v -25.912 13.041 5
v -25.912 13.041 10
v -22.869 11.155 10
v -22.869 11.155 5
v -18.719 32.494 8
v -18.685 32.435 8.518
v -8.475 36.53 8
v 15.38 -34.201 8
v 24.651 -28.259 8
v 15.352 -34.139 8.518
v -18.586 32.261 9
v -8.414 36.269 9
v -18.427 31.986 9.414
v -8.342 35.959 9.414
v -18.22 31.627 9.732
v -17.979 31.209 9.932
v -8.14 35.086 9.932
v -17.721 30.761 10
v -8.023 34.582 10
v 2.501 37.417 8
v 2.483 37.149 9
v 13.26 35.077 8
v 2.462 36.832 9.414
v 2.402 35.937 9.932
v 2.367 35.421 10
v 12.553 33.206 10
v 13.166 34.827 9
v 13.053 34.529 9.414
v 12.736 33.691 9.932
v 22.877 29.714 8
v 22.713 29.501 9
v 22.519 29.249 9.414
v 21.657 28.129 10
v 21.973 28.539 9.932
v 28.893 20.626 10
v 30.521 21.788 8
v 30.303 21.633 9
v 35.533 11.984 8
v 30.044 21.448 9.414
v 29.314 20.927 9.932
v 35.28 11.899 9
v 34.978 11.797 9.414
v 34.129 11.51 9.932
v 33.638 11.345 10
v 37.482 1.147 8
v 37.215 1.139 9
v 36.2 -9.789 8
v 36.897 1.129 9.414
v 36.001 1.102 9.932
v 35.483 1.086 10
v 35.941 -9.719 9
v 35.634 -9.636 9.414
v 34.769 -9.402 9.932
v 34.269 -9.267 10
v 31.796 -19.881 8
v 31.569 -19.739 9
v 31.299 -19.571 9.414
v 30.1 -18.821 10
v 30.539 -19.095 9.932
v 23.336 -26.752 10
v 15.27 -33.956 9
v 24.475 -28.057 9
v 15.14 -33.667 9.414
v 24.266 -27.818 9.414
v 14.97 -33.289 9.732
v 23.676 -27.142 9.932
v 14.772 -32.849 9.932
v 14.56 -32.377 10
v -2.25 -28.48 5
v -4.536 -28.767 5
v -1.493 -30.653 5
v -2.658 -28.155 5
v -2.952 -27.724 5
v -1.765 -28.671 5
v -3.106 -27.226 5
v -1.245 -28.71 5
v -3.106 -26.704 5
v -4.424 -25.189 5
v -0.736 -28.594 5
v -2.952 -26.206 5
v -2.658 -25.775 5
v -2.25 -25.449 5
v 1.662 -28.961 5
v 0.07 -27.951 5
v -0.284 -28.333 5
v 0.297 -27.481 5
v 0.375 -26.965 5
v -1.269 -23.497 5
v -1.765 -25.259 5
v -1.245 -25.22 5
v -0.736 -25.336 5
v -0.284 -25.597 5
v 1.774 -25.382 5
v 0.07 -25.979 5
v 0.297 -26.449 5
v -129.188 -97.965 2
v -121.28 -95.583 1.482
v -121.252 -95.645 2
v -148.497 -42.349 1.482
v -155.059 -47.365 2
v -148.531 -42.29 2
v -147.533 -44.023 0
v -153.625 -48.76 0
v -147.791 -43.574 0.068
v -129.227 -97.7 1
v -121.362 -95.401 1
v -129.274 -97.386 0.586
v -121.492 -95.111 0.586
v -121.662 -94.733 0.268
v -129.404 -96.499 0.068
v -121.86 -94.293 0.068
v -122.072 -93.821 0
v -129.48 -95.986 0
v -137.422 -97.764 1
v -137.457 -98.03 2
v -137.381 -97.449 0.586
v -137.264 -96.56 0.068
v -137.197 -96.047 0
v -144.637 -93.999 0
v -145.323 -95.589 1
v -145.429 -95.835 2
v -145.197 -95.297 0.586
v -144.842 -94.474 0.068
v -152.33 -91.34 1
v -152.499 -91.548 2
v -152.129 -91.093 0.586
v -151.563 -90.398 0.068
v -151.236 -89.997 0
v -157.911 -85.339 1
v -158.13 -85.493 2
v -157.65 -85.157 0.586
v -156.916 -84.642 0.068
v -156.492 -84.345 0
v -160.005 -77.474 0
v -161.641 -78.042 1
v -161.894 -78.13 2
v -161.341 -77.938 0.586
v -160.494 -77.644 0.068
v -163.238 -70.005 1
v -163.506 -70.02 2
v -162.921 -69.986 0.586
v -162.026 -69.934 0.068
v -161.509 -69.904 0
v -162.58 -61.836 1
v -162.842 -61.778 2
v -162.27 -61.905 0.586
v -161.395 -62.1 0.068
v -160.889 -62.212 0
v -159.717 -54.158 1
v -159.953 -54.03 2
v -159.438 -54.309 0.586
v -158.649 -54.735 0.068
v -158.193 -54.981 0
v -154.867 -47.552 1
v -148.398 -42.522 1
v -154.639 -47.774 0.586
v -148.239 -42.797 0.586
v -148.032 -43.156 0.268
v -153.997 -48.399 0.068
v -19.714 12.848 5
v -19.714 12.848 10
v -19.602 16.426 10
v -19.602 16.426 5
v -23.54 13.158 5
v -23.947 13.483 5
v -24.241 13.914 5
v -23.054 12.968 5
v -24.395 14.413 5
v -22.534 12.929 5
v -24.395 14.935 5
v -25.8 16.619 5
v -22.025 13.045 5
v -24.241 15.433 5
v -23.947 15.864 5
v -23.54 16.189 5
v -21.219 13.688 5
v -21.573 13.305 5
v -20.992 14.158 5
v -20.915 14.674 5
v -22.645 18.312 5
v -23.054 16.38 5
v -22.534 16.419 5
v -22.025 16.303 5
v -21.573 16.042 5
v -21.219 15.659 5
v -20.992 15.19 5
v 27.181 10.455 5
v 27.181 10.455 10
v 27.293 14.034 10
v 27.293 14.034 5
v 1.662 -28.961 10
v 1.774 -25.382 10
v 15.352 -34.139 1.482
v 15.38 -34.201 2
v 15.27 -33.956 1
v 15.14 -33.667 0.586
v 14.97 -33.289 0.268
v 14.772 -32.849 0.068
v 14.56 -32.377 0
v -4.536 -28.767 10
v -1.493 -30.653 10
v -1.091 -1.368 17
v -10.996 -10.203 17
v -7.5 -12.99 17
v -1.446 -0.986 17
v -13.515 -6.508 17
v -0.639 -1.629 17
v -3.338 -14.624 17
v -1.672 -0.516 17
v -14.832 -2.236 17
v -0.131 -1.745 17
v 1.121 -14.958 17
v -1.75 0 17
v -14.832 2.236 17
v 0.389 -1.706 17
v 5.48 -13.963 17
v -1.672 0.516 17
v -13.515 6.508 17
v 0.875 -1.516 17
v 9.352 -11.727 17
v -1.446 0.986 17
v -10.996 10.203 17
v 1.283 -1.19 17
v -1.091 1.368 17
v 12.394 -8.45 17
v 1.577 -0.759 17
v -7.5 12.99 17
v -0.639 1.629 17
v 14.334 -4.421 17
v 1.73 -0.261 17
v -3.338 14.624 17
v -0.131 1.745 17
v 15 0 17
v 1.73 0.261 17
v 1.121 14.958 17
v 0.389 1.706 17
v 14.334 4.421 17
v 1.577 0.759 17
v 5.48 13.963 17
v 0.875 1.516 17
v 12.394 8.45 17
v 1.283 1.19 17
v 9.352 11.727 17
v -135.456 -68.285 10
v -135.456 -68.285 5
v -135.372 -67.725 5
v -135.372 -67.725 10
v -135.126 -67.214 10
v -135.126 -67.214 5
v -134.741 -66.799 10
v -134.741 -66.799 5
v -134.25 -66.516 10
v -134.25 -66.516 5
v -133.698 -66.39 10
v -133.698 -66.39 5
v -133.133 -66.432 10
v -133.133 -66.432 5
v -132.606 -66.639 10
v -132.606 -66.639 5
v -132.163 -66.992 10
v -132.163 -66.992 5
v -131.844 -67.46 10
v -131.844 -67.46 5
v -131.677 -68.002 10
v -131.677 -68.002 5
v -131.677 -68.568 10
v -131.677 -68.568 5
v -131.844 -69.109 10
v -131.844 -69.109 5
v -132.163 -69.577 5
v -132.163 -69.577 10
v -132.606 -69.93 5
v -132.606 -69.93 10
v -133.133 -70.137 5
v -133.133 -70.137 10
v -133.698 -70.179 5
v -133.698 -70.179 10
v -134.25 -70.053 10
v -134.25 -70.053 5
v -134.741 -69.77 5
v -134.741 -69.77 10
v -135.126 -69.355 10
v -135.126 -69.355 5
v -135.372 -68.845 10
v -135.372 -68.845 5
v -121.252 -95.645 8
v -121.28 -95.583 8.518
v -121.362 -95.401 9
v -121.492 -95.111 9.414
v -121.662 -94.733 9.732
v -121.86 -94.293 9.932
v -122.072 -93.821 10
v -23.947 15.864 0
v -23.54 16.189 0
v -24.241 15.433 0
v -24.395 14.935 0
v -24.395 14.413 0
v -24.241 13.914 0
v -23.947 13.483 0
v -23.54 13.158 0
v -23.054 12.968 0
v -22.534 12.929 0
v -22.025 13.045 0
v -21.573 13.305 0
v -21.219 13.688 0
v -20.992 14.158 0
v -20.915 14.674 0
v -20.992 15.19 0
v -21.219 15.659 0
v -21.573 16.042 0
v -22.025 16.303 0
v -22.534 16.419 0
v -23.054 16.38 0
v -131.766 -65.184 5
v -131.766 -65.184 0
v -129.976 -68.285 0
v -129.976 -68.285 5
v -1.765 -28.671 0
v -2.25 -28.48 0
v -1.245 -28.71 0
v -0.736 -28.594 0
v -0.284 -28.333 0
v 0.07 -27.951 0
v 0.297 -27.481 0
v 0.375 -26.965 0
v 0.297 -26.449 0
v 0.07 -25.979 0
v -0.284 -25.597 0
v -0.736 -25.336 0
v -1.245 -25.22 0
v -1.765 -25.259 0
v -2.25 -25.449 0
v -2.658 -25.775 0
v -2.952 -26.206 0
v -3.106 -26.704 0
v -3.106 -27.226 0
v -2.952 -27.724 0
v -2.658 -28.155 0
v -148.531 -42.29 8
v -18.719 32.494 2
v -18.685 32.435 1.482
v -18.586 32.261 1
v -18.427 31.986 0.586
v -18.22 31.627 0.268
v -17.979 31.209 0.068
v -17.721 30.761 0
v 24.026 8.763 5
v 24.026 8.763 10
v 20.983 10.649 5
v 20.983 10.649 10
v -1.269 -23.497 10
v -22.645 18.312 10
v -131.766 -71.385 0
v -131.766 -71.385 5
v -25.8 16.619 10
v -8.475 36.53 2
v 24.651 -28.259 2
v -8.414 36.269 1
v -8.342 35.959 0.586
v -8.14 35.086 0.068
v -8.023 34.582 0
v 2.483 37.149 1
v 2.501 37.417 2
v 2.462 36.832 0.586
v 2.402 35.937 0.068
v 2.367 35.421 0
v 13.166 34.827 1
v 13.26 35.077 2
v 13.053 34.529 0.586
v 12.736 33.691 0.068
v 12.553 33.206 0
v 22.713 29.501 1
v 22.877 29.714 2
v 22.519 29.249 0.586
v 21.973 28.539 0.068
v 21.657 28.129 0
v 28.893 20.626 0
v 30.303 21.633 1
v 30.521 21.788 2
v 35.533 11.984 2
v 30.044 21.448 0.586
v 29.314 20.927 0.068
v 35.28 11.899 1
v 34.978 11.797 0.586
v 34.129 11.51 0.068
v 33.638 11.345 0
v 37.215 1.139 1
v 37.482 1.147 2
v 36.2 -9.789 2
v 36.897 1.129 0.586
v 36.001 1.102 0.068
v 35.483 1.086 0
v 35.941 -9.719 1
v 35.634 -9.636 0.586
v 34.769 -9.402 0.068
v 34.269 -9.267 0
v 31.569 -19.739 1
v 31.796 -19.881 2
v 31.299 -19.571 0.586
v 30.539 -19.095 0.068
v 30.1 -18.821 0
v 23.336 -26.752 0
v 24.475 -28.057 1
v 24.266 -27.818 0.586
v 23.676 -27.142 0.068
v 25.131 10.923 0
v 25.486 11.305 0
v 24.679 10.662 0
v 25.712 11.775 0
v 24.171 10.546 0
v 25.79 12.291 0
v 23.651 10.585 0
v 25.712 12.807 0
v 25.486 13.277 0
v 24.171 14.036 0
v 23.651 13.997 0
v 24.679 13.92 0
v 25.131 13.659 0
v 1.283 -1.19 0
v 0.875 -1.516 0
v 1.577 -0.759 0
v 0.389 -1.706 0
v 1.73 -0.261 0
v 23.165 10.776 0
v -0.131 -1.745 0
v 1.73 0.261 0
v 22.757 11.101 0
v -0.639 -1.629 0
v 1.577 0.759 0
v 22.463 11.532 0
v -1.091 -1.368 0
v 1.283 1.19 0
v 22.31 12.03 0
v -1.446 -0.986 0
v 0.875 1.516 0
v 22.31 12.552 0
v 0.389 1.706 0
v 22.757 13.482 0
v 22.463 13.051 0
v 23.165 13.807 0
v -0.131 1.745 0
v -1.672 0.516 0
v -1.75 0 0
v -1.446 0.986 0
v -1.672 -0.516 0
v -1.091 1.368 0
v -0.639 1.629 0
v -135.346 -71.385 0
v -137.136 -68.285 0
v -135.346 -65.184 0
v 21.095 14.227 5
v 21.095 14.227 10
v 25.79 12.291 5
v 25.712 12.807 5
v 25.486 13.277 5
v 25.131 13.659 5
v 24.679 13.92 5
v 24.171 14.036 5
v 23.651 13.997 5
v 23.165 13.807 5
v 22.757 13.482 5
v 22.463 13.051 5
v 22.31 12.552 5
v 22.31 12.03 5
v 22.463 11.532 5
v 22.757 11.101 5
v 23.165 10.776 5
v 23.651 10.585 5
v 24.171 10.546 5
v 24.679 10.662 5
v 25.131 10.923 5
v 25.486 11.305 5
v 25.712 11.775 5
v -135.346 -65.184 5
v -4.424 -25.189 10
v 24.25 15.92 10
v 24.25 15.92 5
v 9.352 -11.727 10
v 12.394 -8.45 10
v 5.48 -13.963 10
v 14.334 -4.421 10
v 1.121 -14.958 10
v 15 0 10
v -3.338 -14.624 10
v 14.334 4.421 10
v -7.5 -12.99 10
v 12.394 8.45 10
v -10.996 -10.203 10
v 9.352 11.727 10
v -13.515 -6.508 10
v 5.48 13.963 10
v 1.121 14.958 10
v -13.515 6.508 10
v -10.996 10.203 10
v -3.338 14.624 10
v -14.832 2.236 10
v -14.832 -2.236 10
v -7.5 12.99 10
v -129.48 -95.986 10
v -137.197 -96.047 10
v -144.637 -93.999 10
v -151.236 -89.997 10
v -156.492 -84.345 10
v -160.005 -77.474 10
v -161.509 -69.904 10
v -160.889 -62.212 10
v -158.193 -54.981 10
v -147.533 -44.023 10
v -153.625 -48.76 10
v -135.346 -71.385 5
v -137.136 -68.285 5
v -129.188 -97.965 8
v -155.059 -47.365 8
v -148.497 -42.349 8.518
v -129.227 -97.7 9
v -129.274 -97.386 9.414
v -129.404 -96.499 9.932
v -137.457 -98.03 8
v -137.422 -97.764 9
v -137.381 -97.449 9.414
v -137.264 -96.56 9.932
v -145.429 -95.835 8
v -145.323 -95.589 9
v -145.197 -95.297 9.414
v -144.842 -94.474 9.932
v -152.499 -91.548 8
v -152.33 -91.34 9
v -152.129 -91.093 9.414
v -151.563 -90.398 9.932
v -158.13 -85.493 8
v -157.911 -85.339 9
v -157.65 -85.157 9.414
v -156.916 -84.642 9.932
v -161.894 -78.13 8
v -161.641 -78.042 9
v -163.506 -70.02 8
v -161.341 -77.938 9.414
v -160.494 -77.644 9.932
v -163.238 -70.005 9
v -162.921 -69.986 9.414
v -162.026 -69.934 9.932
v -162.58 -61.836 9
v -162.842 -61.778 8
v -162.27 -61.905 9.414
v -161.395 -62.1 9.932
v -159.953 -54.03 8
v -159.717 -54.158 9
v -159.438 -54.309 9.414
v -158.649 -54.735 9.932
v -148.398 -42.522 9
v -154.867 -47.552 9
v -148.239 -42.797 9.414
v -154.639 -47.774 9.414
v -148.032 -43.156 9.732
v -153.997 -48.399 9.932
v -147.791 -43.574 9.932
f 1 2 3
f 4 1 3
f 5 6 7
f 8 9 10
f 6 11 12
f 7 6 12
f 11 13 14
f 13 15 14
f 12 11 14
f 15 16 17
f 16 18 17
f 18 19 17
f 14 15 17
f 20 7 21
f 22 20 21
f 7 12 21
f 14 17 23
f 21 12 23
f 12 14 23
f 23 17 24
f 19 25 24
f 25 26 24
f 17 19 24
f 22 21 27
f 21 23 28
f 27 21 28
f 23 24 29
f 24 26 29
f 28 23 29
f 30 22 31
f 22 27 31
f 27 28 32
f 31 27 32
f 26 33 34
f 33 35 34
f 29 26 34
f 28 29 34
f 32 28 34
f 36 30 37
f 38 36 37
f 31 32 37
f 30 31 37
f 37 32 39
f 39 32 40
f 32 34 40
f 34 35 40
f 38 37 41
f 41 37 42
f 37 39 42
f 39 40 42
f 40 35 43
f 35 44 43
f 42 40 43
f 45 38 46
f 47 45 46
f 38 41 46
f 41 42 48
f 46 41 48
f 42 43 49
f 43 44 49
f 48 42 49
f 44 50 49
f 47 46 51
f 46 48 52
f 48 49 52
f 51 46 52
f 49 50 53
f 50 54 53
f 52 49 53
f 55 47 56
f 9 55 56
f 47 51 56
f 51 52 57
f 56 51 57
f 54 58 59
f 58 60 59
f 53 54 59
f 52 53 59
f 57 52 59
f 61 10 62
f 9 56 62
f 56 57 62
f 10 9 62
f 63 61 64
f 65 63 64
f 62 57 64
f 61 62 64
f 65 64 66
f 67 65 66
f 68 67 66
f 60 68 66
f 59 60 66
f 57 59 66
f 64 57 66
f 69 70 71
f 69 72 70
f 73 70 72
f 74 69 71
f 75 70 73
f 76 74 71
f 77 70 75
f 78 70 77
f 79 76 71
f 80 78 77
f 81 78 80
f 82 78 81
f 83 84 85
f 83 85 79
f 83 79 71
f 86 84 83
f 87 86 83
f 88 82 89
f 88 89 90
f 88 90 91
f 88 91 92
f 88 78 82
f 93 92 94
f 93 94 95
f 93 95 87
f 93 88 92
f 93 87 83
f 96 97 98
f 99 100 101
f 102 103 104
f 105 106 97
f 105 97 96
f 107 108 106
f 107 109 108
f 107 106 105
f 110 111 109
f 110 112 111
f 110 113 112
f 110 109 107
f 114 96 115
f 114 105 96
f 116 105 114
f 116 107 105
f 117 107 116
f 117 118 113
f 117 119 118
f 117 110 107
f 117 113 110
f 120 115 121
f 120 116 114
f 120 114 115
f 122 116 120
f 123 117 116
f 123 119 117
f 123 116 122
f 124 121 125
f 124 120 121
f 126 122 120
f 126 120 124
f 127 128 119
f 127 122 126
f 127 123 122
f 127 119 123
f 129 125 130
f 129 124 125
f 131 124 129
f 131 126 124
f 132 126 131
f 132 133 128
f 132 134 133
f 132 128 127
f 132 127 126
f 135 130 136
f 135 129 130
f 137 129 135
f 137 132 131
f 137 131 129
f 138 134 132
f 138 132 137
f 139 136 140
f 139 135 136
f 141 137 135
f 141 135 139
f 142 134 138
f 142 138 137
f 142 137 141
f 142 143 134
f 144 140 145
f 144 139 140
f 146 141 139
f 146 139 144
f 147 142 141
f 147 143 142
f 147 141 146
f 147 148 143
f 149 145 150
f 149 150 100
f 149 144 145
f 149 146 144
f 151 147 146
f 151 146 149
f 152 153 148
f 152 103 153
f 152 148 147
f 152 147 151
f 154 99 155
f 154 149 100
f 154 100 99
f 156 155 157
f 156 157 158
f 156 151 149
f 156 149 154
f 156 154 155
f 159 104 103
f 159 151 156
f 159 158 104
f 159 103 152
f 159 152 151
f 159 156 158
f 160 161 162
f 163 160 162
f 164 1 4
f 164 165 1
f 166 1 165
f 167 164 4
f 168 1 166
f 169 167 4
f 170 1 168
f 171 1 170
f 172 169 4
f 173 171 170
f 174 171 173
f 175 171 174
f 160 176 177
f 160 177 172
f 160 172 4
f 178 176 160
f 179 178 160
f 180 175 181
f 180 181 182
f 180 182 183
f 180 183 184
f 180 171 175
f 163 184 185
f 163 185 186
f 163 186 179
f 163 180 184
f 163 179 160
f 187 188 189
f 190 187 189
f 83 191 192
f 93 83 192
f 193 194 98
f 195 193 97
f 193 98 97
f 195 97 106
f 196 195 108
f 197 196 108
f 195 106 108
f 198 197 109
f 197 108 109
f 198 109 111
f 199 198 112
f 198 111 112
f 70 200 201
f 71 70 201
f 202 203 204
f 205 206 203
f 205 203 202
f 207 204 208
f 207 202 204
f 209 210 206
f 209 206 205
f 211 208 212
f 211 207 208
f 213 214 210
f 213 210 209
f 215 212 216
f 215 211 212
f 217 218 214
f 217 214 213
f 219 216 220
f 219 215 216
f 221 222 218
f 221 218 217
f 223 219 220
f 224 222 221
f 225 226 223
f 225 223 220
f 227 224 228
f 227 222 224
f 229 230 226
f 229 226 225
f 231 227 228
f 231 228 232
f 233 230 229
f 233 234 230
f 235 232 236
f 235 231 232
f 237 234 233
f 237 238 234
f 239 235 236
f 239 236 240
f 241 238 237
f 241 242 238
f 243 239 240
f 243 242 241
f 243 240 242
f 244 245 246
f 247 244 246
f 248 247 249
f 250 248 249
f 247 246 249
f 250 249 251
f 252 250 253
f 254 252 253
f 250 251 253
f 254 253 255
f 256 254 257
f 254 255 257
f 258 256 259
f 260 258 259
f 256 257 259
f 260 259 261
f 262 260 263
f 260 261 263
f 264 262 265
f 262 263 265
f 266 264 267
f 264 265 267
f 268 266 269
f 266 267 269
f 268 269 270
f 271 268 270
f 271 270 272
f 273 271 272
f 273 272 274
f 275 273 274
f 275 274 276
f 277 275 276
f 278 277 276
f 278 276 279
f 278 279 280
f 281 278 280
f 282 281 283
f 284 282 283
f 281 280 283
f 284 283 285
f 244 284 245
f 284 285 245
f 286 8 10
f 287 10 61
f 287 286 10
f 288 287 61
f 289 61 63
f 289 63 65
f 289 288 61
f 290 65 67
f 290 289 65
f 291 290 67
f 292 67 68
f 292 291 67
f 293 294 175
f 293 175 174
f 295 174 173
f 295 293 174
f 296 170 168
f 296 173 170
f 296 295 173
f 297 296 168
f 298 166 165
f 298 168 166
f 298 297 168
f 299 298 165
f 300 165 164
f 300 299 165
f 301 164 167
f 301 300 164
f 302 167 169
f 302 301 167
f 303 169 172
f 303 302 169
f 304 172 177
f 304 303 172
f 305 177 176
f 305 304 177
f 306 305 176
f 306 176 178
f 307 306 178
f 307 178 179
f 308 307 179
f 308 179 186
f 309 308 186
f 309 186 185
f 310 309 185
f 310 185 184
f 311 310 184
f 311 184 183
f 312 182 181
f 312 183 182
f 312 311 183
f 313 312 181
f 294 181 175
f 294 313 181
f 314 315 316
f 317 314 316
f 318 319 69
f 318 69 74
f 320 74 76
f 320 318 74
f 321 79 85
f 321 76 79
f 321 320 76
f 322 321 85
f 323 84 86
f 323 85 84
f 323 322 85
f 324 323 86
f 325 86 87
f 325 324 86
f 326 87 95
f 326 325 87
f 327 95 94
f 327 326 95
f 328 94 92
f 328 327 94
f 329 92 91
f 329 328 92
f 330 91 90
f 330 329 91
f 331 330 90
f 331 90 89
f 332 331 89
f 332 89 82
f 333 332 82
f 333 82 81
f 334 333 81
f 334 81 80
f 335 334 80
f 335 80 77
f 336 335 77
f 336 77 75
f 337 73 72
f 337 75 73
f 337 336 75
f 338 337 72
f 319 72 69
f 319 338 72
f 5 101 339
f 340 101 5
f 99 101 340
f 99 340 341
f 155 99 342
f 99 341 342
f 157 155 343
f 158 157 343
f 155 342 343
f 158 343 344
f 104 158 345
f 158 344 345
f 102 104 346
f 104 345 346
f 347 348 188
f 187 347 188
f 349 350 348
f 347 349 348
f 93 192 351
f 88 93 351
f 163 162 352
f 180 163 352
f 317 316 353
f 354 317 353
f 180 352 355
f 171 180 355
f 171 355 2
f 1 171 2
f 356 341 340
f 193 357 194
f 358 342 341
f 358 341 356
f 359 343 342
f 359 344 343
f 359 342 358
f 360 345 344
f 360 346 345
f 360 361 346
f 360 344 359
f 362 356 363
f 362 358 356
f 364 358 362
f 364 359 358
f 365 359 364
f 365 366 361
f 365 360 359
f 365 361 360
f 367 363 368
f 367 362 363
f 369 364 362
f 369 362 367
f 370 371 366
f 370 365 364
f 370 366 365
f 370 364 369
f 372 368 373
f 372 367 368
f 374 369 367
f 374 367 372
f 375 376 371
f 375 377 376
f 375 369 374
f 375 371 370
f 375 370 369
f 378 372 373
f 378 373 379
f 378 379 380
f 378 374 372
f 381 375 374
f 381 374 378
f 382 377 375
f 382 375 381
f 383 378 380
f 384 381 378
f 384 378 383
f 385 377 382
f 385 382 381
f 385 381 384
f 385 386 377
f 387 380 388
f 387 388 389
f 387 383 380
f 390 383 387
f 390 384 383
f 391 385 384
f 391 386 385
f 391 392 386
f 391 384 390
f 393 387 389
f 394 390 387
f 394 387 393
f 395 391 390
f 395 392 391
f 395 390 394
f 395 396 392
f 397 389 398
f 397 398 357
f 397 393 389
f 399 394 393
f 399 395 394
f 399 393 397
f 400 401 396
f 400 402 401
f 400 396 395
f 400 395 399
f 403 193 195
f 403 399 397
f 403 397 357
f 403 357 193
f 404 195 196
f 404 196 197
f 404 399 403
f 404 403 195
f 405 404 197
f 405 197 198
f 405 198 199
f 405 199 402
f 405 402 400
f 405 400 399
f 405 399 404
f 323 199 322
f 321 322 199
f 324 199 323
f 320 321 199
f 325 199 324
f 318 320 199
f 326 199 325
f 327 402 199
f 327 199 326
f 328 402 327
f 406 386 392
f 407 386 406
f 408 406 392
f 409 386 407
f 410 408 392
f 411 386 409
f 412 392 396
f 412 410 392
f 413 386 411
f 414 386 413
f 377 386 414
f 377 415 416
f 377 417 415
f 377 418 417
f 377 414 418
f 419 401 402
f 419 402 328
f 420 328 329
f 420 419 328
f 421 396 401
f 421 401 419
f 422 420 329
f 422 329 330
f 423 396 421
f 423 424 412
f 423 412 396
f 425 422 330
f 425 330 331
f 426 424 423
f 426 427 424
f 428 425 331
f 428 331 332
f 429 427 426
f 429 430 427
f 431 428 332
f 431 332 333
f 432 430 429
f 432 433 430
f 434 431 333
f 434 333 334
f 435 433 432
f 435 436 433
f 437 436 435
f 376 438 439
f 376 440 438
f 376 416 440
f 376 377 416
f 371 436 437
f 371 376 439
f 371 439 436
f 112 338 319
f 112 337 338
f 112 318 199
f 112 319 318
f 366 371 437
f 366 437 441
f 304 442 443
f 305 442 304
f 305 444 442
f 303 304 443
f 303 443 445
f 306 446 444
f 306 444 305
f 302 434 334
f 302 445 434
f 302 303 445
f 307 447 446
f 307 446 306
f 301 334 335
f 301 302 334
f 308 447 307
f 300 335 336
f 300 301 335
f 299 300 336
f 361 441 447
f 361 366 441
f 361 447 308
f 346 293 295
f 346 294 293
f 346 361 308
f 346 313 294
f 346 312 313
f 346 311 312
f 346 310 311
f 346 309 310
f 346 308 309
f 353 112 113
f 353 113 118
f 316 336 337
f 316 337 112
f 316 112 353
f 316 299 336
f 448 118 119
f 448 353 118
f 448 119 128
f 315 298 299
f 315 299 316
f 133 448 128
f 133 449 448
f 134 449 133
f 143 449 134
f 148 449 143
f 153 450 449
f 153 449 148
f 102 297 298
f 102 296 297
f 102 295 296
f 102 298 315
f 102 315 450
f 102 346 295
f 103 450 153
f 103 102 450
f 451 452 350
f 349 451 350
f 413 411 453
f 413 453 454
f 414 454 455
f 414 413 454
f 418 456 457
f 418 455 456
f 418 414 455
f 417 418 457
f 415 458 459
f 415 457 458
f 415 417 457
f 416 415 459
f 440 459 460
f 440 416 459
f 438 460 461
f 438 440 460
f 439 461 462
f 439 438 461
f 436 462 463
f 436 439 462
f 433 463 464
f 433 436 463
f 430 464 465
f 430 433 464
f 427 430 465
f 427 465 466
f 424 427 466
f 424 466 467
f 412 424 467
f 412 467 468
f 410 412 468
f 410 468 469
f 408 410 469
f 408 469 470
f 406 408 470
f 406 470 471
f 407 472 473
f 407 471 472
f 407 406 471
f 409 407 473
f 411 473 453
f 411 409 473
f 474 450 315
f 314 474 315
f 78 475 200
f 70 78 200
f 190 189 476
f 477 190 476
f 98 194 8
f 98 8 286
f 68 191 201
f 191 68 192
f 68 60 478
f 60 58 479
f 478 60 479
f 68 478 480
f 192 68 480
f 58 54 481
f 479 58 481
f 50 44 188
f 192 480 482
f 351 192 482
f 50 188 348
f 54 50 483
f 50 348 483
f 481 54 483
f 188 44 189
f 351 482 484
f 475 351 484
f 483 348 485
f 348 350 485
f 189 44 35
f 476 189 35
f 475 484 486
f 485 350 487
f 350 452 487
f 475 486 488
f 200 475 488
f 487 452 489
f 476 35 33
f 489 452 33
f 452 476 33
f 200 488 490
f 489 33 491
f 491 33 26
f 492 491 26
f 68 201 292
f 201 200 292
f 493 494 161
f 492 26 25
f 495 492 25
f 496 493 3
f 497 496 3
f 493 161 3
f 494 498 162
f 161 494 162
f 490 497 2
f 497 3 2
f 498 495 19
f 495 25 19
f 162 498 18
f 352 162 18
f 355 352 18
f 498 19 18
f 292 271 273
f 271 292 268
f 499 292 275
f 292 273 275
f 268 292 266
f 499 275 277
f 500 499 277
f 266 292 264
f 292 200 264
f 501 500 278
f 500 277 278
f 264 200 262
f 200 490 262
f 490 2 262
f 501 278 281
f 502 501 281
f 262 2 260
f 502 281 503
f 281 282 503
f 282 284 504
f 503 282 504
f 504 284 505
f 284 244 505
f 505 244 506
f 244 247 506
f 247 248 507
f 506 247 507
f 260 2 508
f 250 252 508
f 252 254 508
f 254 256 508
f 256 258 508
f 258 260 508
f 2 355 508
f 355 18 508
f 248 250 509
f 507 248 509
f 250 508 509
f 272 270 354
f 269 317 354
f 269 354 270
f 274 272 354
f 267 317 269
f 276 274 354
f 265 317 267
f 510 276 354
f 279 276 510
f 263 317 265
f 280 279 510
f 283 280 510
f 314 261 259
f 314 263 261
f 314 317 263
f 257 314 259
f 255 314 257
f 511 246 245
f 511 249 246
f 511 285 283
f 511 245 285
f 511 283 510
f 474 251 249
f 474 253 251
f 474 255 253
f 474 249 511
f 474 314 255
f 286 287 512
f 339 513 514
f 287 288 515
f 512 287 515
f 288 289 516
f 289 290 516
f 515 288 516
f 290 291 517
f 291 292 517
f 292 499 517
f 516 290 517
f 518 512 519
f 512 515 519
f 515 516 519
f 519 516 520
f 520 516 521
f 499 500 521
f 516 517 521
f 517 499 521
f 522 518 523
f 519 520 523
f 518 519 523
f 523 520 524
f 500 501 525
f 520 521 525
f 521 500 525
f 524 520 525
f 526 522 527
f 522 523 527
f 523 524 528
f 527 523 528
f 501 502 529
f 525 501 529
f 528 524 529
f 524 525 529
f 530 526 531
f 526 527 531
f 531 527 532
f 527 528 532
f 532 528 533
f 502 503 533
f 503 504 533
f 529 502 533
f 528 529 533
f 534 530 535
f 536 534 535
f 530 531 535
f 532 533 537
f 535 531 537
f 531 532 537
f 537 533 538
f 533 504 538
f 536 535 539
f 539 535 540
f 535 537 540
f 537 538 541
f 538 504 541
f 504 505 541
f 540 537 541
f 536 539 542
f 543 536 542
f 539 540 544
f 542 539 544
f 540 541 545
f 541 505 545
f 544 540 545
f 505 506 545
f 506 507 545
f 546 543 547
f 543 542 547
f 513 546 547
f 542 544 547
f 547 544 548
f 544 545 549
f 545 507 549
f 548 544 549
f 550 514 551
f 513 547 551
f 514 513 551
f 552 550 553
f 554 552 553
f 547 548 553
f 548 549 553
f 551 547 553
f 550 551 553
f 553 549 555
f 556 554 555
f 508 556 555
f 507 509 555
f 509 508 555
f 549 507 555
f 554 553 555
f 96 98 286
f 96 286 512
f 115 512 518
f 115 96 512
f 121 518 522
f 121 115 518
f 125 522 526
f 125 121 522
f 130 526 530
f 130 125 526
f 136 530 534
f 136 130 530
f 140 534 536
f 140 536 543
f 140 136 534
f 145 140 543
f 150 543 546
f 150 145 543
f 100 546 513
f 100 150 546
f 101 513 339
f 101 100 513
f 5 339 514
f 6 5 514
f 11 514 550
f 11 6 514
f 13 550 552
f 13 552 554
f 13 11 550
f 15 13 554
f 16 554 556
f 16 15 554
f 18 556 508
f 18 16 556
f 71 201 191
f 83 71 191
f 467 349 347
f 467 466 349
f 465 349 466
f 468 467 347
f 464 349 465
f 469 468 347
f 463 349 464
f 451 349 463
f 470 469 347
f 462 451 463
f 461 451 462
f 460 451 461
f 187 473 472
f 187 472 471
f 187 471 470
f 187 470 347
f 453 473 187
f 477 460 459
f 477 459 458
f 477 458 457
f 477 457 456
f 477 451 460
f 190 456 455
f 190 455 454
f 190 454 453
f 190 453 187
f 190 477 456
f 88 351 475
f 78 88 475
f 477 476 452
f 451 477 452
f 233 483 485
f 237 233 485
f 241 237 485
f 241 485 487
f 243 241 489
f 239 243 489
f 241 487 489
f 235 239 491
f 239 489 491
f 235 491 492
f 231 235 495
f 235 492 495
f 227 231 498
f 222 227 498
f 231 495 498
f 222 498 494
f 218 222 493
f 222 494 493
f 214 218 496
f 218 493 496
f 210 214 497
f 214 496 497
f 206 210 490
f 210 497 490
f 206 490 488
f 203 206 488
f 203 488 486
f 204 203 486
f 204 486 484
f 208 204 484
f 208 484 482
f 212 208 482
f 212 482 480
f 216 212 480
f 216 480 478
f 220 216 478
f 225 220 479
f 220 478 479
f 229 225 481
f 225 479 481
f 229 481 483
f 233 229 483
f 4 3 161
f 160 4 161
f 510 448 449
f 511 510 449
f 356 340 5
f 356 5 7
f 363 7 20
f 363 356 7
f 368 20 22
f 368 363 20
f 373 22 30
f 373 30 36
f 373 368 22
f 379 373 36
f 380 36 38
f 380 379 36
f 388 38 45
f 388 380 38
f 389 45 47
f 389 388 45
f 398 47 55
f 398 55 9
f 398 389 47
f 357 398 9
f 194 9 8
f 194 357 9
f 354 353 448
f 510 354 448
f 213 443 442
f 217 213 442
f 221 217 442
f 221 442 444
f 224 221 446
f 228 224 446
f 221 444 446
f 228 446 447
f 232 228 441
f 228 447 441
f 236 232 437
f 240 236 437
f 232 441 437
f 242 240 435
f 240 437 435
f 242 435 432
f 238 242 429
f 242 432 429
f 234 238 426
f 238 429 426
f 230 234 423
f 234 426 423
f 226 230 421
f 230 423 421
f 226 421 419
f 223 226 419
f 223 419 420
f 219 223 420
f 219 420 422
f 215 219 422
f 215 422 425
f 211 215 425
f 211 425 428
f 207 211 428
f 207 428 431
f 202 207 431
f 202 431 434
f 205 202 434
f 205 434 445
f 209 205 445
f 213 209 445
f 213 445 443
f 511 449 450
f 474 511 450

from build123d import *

# Parameters (mm, degrees)
BOSS_EXTRUDE1_DEPTH = 10
FILLET1_R           = 2
CUT_EXTRUDE8_DEPTH  = 5
CUT_EXTRUDE9_START  = -70
SKETCH10_R          = 1.75
CUT_EXTRUDE9_DEPTH  = 71
CIRPATTERN1_COUNT   = 3
SKETCH12_R          = 15
BOSS_EXTRUDE2_DEPTH = 7
CUT_EXTRUDE11_DEPTH = 5
SKETCH15_R          = 1.9
CUT_EXTRUDE12_DEPTH = 5
SKETCH16_R          = 1.75
CUT_EXTRUDE13_DEPTH = 18


with BuildPart() as part:
    # Sketch1 → Boss-Extrude1 (new body)
    with BuildSketch(Plane.XY):
        with BuildLine():
            Line((-148.531383238, -42.289811934), (-18.719283585, 32.493667415))
            ThreePointArc((-18.719283585, 32.493667415), (33.388989093, 17.071186467), (15.380384675, -34.200786062))
            Line((15.380384675, -34.200786062), (-121.25164863, -95.645374716))
            ThreePointArc((-121.25164863, -95.645374716), (-160.267147644, -81.941695039), (-148.531383238, -42.289811934))
        make_face()
    extrude(amount=BOSS_EXTRUDE1_DEPTH)

    # Fillet1
    fillet1_edges = [part.edges().sort_by_distance(p)[0] for p in [
        (33.388989093, 17.071186467, 10),
        (-83.625333411, -4.89807226, 10),
        (-160.267147644, -81.941695039, 10),
        (-83.625333411, -4.89807226, 0),
        (33.388989093, 17.071186467, 0),
        (-52.935631977, -64.923080389, 0),
        (-160.267147644, -81.941695039, 0),
        (-52.935631977, -64.923080389, 10),
    ]]
    fillet(fillet1_edges, radius=FILLET1_R)

    # Sketch3 → Cut-Extrude8 (cut)
    with BuildSketch(Plane.XY.offset(10)):
        Polygon((-4.424109202, -25.18892785), (-4.53581637, -28.767184619), (-1.492808691, -30.65305425), (1.661906157, -28.96066711), (1.773613325, -25.382410341), (-1.269394354, -23.496540711), align=None)
        Polygon((27.292728029, 14.033716876), (24.249720349, 15.919586506), (21.095005502, 14.227199366), (20.983298334, 10.648942597), (24.026306013, 8.763072967), (27.181020861, 10.455460106), align=None)
        Polygon((-19.602196811, 16.425854883), (-22.645204491, 18.311724513), (-25.799919338, 16.619337374), (-25.911626506, 13.041080604), (-22.868618827, 11.155210974), (-19.713903979, 12.847598114), align=None)
    extrude(amount=-CUT_EXTRUDE8_DEPTH, mode=Mode.SUBTRACT)

    # Sketch10 → Cut-Extrude9 (cut)
    with BuildSketch(Plane.XY.offset(5).offset(CUT_EXTRUDE9_START)):
        with Locations((24.040072147, 12.291254256)):
            Circle(SKETCH10_R)
    cut_extrude9 = extrude(amount=CUT_EXTRUDE9_DEPTH, mode=Mode.SUBTRACT)

    # CirPattern1: Cut-Extrude9 ×3 about axis
    cirpattern1_axis = Axis((0, 0, 0), (0, 0, 1))
    for i in range(1, CIRPATTERN1_COUNT):
        add(cut_extrude9.rotate(cirpattern1_axis, i * 360 / CIRPATTERN1_COUNT), mode=Mode.SUBTRACT)

    # Sketch12 → Boss-Extrude2 (add)
    with BuildSketch(Plane.XY.offset(10)):
        Circle(SKETCH12_R)
    extrude(amount=BOSS_EXTRUDE2_DEPTH)

    # Sketch14 → Cut-Extrude11 (cut)
    with BuildSketch(Plane(origin=(0, 0, 0), x_dir=(-1, 0, 0), z_dir=(0, 0, -1))):
        Polygon((137.13595637, -68.284745866), (135.34595637, -65.184374921), (131.76595637, -65.184374921), (129.97595637, -68.284745866), (131.76595637, -71.385116812), (135.34595637, -71.385116812), align=None)
    extrude(amount=-CUT_EXTRUDE11_DEPTH, mode=Mode.SUBTRACT)

    # Sketch15 → Cut-Extrude12 (cut)
    with BuildSketch(Plane(origin=(0, 0, 5), x_dir=(-1, 0, 0), z_dir=(0, 0, -1))):
        with Locations((133.55595637, -68.284745866)):
            Circle(SKETCH15_R)
    extrude(amount=-CUT_EXTRUDE12_DEPTH, mode=Mode.SUBTRACT)

    # Sketch16 → Cut-Extrude13 (cut)
    with BuildSketch(Plane(origin=(0, 0, 0), x_dir=(-1, 0, 0), z_dir=(0, 0, -1))):
        Circle(SKETCH16_R)
    extrude(amount=-CUT_EXTRUDE13_DEPTH, mode=Mode.SUBTRACT)


solid = part.part
